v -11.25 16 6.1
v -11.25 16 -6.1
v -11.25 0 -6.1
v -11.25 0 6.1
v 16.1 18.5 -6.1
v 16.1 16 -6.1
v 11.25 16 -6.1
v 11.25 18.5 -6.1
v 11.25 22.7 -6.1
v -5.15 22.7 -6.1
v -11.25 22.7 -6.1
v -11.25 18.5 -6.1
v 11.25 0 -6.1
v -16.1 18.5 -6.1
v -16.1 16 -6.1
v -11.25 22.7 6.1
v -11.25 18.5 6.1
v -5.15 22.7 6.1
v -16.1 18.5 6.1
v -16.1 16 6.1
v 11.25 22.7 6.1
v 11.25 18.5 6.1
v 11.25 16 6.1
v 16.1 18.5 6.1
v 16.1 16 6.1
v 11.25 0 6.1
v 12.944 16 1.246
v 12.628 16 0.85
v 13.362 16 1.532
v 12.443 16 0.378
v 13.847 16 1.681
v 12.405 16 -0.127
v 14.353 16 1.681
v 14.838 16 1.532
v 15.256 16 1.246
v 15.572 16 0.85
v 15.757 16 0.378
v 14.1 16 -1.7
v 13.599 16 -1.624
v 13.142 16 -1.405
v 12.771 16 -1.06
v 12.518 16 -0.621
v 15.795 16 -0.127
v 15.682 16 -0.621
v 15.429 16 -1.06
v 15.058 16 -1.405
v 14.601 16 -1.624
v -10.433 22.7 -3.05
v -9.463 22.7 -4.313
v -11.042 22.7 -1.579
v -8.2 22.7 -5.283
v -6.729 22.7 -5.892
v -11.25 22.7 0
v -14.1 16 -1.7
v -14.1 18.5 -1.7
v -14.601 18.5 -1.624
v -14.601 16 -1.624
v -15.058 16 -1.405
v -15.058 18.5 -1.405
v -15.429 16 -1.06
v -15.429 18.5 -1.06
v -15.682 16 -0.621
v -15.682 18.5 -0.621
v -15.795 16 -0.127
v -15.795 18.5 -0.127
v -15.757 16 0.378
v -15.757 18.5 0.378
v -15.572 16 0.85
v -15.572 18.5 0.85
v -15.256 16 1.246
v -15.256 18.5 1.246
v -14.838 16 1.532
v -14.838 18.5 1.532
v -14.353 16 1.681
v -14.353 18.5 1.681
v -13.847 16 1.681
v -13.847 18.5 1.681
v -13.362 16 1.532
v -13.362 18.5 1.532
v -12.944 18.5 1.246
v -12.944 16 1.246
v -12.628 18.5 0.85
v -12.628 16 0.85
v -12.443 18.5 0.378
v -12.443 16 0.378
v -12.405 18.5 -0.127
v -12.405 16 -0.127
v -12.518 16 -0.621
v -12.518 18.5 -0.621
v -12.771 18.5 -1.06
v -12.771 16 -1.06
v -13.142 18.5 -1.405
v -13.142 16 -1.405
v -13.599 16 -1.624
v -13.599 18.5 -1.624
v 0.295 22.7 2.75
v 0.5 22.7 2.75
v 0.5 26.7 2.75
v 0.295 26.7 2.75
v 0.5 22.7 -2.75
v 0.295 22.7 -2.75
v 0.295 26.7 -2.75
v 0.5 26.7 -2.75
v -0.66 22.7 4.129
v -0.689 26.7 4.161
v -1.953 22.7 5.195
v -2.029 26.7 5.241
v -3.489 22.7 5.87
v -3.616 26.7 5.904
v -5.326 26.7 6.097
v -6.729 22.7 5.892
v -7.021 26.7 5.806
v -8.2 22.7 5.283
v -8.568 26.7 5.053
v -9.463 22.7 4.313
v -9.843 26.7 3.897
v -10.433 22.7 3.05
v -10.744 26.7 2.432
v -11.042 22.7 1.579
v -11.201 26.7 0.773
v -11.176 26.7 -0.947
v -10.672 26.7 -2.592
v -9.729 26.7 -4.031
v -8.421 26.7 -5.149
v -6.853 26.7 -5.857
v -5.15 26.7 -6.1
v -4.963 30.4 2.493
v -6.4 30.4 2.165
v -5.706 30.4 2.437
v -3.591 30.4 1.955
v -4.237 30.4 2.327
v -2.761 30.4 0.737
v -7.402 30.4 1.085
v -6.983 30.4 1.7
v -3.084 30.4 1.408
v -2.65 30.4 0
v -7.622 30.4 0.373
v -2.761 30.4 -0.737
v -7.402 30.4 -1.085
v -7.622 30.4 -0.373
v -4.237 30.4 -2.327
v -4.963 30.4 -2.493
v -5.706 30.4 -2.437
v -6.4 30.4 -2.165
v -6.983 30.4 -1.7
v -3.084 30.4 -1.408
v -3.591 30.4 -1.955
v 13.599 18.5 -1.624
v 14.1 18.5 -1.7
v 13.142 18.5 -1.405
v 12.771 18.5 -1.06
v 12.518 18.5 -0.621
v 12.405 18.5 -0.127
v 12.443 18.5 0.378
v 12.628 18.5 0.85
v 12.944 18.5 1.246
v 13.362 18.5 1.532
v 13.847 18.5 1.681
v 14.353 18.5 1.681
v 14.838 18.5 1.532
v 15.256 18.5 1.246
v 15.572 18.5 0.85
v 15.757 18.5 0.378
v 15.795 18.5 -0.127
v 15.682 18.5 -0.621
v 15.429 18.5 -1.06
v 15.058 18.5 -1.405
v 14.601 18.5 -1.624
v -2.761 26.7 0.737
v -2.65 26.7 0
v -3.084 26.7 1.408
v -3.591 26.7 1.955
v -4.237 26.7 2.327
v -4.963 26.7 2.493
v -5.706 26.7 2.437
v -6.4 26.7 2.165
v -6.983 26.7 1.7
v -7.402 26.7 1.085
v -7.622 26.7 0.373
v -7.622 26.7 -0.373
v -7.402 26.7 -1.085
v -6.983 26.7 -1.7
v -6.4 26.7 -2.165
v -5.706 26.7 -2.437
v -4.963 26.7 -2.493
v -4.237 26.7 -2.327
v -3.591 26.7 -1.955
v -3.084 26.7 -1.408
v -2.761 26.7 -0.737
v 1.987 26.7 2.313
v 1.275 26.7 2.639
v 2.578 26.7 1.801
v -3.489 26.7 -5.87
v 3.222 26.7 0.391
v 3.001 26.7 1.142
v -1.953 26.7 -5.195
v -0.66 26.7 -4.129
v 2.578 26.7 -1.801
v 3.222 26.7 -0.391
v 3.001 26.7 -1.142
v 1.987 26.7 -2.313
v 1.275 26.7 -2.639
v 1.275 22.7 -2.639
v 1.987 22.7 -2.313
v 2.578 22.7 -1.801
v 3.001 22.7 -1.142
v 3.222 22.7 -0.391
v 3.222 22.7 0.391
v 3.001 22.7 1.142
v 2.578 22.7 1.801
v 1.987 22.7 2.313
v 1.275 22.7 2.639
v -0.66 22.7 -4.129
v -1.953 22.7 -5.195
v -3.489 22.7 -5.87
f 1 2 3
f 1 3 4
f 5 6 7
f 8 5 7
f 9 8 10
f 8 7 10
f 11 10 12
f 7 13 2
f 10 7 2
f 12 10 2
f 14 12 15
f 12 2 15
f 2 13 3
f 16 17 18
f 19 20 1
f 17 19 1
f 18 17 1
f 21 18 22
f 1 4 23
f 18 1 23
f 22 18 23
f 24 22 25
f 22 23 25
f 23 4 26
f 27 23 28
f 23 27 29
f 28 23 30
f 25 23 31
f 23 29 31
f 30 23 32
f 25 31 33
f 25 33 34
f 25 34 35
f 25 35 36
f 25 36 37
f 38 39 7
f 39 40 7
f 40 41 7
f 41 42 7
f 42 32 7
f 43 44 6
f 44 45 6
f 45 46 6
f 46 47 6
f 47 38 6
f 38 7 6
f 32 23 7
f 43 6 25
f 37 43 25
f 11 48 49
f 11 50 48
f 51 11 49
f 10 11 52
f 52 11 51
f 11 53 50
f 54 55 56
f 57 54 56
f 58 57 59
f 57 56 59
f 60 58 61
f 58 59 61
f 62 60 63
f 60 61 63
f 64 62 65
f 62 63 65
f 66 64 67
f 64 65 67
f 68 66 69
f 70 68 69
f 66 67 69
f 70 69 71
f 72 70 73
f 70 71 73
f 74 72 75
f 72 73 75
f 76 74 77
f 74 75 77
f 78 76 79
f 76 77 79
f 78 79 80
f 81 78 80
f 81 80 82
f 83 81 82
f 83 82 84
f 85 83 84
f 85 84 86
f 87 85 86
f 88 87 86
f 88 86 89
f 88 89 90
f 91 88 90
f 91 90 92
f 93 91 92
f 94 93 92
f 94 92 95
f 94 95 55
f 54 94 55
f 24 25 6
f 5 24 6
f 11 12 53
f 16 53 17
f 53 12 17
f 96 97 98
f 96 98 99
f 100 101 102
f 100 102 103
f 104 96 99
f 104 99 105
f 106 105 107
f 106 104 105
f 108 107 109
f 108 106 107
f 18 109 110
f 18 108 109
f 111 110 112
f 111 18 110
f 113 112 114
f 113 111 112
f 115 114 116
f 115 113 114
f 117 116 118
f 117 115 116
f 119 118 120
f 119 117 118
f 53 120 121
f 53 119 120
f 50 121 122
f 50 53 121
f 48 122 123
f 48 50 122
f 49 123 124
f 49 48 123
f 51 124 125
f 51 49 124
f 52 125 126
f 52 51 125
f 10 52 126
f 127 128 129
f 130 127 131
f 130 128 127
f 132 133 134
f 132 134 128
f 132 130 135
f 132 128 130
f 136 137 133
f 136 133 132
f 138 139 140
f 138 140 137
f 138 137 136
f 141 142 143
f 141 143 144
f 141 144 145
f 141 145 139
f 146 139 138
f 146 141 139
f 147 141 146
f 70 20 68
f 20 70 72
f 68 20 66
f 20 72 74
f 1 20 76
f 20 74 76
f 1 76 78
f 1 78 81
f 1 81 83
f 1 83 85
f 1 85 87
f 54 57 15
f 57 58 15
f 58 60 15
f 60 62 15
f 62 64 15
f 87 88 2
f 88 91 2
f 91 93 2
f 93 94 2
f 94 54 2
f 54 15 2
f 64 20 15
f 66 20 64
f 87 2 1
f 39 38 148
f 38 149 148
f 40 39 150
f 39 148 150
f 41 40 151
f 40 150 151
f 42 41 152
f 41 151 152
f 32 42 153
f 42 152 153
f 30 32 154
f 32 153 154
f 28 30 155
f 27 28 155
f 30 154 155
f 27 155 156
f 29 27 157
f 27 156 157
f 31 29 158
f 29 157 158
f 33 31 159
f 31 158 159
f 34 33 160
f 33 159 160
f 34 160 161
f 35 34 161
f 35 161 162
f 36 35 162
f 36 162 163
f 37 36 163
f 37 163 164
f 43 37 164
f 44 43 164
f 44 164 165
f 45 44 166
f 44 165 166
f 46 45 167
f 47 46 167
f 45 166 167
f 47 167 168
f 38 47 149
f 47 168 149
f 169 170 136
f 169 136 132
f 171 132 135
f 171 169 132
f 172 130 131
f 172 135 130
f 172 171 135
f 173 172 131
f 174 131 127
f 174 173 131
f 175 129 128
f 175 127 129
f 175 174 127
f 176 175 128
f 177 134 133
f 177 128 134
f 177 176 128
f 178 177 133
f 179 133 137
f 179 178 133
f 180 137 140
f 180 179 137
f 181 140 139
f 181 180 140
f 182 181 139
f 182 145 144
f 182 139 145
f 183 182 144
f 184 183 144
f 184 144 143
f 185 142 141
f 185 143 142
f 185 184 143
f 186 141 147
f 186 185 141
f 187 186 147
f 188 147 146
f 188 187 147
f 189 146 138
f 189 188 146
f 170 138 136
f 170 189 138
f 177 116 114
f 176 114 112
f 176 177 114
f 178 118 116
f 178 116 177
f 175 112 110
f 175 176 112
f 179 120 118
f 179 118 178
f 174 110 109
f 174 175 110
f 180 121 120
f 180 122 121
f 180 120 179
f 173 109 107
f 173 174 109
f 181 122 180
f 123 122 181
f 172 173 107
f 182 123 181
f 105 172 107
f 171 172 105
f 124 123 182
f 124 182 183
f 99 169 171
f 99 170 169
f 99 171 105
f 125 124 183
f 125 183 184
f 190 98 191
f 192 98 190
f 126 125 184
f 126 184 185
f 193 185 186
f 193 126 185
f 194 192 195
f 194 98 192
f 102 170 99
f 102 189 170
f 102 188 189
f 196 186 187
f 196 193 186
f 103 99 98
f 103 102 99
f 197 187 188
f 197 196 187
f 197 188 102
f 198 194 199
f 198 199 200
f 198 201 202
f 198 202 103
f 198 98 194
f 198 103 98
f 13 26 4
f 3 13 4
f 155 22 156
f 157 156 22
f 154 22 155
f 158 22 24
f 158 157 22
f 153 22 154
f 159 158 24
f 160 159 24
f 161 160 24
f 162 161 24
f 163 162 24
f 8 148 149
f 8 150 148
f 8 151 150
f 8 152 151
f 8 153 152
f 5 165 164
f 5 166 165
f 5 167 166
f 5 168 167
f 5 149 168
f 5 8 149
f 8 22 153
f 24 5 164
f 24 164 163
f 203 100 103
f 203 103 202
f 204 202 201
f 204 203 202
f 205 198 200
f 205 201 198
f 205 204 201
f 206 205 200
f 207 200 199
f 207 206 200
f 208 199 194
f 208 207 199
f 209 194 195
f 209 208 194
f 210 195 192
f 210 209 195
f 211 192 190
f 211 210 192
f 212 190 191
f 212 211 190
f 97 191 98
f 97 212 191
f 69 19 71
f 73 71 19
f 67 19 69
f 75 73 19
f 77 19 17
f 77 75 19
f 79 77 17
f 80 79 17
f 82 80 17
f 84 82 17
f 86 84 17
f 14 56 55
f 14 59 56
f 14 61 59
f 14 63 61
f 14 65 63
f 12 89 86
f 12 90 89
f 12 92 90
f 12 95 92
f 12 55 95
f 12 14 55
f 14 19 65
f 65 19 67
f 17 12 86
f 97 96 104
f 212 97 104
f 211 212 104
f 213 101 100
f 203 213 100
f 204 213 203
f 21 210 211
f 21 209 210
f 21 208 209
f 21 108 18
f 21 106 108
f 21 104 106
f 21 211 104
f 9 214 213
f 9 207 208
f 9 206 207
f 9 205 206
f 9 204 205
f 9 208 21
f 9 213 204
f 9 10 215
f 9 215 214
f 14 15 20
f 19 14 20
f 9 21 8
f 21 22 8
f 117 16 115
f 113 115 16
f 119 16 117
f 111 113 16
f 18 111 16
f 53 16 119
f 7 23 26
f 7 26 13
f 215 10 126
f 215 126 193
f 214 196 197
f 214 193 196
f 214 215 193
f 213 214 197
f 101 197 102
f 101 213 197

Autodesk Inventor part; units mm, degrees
ref_plane "YZ Plane" through (0, 0, 0) normal (1, 0, 0) x (0, 1, 0)
ref_plane "XZ Plane" through (0, 0, 0) normal (0, 1, 0) x (-1, 0, 0)
ref_plane "XY Plane" through (0, 0, 0) normal (0, 0, 1) x (1, 0, 0)
sketch "Sketch1" plane through (0, 0, 0) normal (0, 1, 0) x (-1, 0, 0)
  line L0 (11.25, 6.1) -> (-11.25, 6.1)
  line L1 (-11.25, 6.1) -> (-11.25, -6.1)
  line L2 (-11.25, -6.1) -> (11.25, -6.1)
  line L3 (11.25, -6.1) -> (11.25, 6.1)
  line L4 (11.25, 6.1) -> (-11.25, -6.1) construction
  line L5 (-11.25, 6.1) -> (11.25, -6.1) construction
  point P0 (0, 0)
  dimension "d0" = 22.5
  dimension "d1" = 12.2
extrude "Extrusion1" add sketch "Sketch1" along normal blind 16
sketch "Sketch2" plane through (0, 16, 0) normal (0, 1, 0) x (1, 0, 0)
  line L0 (11.25, -6.1) -> (11.25, 6.1) construction
  line L1 (11.25, 6.1) -> (-11.25, 6.1) projected
  line L2 (-11.25, 6.1) -> (-11.25, -6.1) construction
  line L3 (-11.25, -6.1) -> (11.25, -6.1) projected
  line L4 (11.25, 6.1) -> (-11.25, 6.1) projected
  line L5 (-11.25, 6.1) -> (-16.1, 6.1)
  line L6 (-16.1, 6.1) -> (-16.1, -6.1)
  line L7 (-11.25, 6.1) -> (-11.25, -6.1) projected
  line L8 (-16.1, -6.1) -> (-11.25, -6.1)
  line L9 (11.25, -6.1) -> (11.25, 6.1) projected
  line L10 (11.25, -6.1) -> (16.1, -6.1)
  line L11 (16.1, -6.1) -> (16.1, 6.1)
  line L12 (16.1, 6.1) -> (11.25, 6.1)
  circle A0 centre (-14.1, 0) radius 1.4
  circle A1 centre (14.1, 0) radius 1.4
  line L13 (-11.25, -6.1) -> (11.25, -6.1) construction
  line L14 (0, -6.1) -> (0, 6.1) construction
  point P0 (0, 0)
  dimension "d5" = 32.2
  dimension "d6" = 2.8
  dimension "d7" = 2.8
  dimension "d8" = 31
extrude "Extrusion2" add sketch "Sketch2" along normal blind 2.5
sketch "Sketch3" plane through (0, 18.5, 0) normal (0, 1, 0) x (1, 0, 0)
  line L0 (11.25, -6.1) -> (11.25, 6.1) projected
  line L1 (-11.25, -6.1) -> (11.25, -6.1) projected
  line L2 (-11.25, 6.1) -> (-11.25, -6.1) projected
  line L3 (11.25, 6.1) -> (-11.25, 6.1) projected
  point P0 (0, 0)
extrude "Extrusion3" add sketch "Sketch3" along normal blind 4.2
sketch "Sketch4" plane through (0, 22.7, 0) normal (0, 1, 0) x (1, 0, 0)
  arc A0 (-5.15, 6.1) -> (0.295, -2.75) centre (-5.15, 0) ccw
  arc A1 (0.2987, 2.7426) -> (0.5, -2.75) centre (0.5, 0) ccw construction
  line L0 (11.25, 6.1) -> (-11.25, 6.1) projected
  line L1 (-11.25, 6.1) -> (-11.25, -6.1) projected
  line L2 (-11.25, -6.1) -> (11.25, -6.1) projected
  line L3 (11.25, -6.1) -> (11.25, 6.1) projected
  line L4 (0.295, 2.75) -> (0.5, 2.75)
  line L5 (0.5, -2.75) -> (0.295, -2.75)
  arc A2 (0.5, 2.75) -> (0.2987, 2.7426) centre (0.5, 0) ccw
  arc A3 (0.295, 2.75) -> (-5.15, 6.1) centre (-5.15, 0) ccw
  arc A4 (0.295, -2.75) -> (0.295, 2.75) centre (-5.15, 0) ccw construction
  arc A5 (0.5, -2.75) -> (0.5, 2.75) centre (0.5, 0) ccw
  point P0 (0, 0)
  dimension "d13" = 5.5
  dimension "d14" = 14.5
extrude "Extrusion4" add sketch "Sketch4" along normal blind 4 contours A3 L4 A5 L5 A0
sketch "Sketch5" plane through (0, 26.7, 0) normal (0, 1, 0) x (1, 0, 0)
  circle A0 centre (-5.15, 0) radius 2.5
  arc A1 (0.295, 2.75) -> (0.295, -2.75) centre (-5.15, 0) ccw projected
  point P0 (0, 0)
  dimension "d17" = 5
extrude "Extrusion5" add sketch "Sketch5" along normal blind 3.7
sketch "Sketch7" plane through (0, 16, 0) normal (0, -1, 0) x (1, 0, 0)
  point P0 (14.1, 0)
  point P1 (-14.1, 0)
hole "Hole2" at (14.1, 16, 0) at (-14.1, 16, 0) direction (0, 1, 0) diameter 3.4 end through all
properties part number "Motor_V1" material "Acetal Resin, Black"
